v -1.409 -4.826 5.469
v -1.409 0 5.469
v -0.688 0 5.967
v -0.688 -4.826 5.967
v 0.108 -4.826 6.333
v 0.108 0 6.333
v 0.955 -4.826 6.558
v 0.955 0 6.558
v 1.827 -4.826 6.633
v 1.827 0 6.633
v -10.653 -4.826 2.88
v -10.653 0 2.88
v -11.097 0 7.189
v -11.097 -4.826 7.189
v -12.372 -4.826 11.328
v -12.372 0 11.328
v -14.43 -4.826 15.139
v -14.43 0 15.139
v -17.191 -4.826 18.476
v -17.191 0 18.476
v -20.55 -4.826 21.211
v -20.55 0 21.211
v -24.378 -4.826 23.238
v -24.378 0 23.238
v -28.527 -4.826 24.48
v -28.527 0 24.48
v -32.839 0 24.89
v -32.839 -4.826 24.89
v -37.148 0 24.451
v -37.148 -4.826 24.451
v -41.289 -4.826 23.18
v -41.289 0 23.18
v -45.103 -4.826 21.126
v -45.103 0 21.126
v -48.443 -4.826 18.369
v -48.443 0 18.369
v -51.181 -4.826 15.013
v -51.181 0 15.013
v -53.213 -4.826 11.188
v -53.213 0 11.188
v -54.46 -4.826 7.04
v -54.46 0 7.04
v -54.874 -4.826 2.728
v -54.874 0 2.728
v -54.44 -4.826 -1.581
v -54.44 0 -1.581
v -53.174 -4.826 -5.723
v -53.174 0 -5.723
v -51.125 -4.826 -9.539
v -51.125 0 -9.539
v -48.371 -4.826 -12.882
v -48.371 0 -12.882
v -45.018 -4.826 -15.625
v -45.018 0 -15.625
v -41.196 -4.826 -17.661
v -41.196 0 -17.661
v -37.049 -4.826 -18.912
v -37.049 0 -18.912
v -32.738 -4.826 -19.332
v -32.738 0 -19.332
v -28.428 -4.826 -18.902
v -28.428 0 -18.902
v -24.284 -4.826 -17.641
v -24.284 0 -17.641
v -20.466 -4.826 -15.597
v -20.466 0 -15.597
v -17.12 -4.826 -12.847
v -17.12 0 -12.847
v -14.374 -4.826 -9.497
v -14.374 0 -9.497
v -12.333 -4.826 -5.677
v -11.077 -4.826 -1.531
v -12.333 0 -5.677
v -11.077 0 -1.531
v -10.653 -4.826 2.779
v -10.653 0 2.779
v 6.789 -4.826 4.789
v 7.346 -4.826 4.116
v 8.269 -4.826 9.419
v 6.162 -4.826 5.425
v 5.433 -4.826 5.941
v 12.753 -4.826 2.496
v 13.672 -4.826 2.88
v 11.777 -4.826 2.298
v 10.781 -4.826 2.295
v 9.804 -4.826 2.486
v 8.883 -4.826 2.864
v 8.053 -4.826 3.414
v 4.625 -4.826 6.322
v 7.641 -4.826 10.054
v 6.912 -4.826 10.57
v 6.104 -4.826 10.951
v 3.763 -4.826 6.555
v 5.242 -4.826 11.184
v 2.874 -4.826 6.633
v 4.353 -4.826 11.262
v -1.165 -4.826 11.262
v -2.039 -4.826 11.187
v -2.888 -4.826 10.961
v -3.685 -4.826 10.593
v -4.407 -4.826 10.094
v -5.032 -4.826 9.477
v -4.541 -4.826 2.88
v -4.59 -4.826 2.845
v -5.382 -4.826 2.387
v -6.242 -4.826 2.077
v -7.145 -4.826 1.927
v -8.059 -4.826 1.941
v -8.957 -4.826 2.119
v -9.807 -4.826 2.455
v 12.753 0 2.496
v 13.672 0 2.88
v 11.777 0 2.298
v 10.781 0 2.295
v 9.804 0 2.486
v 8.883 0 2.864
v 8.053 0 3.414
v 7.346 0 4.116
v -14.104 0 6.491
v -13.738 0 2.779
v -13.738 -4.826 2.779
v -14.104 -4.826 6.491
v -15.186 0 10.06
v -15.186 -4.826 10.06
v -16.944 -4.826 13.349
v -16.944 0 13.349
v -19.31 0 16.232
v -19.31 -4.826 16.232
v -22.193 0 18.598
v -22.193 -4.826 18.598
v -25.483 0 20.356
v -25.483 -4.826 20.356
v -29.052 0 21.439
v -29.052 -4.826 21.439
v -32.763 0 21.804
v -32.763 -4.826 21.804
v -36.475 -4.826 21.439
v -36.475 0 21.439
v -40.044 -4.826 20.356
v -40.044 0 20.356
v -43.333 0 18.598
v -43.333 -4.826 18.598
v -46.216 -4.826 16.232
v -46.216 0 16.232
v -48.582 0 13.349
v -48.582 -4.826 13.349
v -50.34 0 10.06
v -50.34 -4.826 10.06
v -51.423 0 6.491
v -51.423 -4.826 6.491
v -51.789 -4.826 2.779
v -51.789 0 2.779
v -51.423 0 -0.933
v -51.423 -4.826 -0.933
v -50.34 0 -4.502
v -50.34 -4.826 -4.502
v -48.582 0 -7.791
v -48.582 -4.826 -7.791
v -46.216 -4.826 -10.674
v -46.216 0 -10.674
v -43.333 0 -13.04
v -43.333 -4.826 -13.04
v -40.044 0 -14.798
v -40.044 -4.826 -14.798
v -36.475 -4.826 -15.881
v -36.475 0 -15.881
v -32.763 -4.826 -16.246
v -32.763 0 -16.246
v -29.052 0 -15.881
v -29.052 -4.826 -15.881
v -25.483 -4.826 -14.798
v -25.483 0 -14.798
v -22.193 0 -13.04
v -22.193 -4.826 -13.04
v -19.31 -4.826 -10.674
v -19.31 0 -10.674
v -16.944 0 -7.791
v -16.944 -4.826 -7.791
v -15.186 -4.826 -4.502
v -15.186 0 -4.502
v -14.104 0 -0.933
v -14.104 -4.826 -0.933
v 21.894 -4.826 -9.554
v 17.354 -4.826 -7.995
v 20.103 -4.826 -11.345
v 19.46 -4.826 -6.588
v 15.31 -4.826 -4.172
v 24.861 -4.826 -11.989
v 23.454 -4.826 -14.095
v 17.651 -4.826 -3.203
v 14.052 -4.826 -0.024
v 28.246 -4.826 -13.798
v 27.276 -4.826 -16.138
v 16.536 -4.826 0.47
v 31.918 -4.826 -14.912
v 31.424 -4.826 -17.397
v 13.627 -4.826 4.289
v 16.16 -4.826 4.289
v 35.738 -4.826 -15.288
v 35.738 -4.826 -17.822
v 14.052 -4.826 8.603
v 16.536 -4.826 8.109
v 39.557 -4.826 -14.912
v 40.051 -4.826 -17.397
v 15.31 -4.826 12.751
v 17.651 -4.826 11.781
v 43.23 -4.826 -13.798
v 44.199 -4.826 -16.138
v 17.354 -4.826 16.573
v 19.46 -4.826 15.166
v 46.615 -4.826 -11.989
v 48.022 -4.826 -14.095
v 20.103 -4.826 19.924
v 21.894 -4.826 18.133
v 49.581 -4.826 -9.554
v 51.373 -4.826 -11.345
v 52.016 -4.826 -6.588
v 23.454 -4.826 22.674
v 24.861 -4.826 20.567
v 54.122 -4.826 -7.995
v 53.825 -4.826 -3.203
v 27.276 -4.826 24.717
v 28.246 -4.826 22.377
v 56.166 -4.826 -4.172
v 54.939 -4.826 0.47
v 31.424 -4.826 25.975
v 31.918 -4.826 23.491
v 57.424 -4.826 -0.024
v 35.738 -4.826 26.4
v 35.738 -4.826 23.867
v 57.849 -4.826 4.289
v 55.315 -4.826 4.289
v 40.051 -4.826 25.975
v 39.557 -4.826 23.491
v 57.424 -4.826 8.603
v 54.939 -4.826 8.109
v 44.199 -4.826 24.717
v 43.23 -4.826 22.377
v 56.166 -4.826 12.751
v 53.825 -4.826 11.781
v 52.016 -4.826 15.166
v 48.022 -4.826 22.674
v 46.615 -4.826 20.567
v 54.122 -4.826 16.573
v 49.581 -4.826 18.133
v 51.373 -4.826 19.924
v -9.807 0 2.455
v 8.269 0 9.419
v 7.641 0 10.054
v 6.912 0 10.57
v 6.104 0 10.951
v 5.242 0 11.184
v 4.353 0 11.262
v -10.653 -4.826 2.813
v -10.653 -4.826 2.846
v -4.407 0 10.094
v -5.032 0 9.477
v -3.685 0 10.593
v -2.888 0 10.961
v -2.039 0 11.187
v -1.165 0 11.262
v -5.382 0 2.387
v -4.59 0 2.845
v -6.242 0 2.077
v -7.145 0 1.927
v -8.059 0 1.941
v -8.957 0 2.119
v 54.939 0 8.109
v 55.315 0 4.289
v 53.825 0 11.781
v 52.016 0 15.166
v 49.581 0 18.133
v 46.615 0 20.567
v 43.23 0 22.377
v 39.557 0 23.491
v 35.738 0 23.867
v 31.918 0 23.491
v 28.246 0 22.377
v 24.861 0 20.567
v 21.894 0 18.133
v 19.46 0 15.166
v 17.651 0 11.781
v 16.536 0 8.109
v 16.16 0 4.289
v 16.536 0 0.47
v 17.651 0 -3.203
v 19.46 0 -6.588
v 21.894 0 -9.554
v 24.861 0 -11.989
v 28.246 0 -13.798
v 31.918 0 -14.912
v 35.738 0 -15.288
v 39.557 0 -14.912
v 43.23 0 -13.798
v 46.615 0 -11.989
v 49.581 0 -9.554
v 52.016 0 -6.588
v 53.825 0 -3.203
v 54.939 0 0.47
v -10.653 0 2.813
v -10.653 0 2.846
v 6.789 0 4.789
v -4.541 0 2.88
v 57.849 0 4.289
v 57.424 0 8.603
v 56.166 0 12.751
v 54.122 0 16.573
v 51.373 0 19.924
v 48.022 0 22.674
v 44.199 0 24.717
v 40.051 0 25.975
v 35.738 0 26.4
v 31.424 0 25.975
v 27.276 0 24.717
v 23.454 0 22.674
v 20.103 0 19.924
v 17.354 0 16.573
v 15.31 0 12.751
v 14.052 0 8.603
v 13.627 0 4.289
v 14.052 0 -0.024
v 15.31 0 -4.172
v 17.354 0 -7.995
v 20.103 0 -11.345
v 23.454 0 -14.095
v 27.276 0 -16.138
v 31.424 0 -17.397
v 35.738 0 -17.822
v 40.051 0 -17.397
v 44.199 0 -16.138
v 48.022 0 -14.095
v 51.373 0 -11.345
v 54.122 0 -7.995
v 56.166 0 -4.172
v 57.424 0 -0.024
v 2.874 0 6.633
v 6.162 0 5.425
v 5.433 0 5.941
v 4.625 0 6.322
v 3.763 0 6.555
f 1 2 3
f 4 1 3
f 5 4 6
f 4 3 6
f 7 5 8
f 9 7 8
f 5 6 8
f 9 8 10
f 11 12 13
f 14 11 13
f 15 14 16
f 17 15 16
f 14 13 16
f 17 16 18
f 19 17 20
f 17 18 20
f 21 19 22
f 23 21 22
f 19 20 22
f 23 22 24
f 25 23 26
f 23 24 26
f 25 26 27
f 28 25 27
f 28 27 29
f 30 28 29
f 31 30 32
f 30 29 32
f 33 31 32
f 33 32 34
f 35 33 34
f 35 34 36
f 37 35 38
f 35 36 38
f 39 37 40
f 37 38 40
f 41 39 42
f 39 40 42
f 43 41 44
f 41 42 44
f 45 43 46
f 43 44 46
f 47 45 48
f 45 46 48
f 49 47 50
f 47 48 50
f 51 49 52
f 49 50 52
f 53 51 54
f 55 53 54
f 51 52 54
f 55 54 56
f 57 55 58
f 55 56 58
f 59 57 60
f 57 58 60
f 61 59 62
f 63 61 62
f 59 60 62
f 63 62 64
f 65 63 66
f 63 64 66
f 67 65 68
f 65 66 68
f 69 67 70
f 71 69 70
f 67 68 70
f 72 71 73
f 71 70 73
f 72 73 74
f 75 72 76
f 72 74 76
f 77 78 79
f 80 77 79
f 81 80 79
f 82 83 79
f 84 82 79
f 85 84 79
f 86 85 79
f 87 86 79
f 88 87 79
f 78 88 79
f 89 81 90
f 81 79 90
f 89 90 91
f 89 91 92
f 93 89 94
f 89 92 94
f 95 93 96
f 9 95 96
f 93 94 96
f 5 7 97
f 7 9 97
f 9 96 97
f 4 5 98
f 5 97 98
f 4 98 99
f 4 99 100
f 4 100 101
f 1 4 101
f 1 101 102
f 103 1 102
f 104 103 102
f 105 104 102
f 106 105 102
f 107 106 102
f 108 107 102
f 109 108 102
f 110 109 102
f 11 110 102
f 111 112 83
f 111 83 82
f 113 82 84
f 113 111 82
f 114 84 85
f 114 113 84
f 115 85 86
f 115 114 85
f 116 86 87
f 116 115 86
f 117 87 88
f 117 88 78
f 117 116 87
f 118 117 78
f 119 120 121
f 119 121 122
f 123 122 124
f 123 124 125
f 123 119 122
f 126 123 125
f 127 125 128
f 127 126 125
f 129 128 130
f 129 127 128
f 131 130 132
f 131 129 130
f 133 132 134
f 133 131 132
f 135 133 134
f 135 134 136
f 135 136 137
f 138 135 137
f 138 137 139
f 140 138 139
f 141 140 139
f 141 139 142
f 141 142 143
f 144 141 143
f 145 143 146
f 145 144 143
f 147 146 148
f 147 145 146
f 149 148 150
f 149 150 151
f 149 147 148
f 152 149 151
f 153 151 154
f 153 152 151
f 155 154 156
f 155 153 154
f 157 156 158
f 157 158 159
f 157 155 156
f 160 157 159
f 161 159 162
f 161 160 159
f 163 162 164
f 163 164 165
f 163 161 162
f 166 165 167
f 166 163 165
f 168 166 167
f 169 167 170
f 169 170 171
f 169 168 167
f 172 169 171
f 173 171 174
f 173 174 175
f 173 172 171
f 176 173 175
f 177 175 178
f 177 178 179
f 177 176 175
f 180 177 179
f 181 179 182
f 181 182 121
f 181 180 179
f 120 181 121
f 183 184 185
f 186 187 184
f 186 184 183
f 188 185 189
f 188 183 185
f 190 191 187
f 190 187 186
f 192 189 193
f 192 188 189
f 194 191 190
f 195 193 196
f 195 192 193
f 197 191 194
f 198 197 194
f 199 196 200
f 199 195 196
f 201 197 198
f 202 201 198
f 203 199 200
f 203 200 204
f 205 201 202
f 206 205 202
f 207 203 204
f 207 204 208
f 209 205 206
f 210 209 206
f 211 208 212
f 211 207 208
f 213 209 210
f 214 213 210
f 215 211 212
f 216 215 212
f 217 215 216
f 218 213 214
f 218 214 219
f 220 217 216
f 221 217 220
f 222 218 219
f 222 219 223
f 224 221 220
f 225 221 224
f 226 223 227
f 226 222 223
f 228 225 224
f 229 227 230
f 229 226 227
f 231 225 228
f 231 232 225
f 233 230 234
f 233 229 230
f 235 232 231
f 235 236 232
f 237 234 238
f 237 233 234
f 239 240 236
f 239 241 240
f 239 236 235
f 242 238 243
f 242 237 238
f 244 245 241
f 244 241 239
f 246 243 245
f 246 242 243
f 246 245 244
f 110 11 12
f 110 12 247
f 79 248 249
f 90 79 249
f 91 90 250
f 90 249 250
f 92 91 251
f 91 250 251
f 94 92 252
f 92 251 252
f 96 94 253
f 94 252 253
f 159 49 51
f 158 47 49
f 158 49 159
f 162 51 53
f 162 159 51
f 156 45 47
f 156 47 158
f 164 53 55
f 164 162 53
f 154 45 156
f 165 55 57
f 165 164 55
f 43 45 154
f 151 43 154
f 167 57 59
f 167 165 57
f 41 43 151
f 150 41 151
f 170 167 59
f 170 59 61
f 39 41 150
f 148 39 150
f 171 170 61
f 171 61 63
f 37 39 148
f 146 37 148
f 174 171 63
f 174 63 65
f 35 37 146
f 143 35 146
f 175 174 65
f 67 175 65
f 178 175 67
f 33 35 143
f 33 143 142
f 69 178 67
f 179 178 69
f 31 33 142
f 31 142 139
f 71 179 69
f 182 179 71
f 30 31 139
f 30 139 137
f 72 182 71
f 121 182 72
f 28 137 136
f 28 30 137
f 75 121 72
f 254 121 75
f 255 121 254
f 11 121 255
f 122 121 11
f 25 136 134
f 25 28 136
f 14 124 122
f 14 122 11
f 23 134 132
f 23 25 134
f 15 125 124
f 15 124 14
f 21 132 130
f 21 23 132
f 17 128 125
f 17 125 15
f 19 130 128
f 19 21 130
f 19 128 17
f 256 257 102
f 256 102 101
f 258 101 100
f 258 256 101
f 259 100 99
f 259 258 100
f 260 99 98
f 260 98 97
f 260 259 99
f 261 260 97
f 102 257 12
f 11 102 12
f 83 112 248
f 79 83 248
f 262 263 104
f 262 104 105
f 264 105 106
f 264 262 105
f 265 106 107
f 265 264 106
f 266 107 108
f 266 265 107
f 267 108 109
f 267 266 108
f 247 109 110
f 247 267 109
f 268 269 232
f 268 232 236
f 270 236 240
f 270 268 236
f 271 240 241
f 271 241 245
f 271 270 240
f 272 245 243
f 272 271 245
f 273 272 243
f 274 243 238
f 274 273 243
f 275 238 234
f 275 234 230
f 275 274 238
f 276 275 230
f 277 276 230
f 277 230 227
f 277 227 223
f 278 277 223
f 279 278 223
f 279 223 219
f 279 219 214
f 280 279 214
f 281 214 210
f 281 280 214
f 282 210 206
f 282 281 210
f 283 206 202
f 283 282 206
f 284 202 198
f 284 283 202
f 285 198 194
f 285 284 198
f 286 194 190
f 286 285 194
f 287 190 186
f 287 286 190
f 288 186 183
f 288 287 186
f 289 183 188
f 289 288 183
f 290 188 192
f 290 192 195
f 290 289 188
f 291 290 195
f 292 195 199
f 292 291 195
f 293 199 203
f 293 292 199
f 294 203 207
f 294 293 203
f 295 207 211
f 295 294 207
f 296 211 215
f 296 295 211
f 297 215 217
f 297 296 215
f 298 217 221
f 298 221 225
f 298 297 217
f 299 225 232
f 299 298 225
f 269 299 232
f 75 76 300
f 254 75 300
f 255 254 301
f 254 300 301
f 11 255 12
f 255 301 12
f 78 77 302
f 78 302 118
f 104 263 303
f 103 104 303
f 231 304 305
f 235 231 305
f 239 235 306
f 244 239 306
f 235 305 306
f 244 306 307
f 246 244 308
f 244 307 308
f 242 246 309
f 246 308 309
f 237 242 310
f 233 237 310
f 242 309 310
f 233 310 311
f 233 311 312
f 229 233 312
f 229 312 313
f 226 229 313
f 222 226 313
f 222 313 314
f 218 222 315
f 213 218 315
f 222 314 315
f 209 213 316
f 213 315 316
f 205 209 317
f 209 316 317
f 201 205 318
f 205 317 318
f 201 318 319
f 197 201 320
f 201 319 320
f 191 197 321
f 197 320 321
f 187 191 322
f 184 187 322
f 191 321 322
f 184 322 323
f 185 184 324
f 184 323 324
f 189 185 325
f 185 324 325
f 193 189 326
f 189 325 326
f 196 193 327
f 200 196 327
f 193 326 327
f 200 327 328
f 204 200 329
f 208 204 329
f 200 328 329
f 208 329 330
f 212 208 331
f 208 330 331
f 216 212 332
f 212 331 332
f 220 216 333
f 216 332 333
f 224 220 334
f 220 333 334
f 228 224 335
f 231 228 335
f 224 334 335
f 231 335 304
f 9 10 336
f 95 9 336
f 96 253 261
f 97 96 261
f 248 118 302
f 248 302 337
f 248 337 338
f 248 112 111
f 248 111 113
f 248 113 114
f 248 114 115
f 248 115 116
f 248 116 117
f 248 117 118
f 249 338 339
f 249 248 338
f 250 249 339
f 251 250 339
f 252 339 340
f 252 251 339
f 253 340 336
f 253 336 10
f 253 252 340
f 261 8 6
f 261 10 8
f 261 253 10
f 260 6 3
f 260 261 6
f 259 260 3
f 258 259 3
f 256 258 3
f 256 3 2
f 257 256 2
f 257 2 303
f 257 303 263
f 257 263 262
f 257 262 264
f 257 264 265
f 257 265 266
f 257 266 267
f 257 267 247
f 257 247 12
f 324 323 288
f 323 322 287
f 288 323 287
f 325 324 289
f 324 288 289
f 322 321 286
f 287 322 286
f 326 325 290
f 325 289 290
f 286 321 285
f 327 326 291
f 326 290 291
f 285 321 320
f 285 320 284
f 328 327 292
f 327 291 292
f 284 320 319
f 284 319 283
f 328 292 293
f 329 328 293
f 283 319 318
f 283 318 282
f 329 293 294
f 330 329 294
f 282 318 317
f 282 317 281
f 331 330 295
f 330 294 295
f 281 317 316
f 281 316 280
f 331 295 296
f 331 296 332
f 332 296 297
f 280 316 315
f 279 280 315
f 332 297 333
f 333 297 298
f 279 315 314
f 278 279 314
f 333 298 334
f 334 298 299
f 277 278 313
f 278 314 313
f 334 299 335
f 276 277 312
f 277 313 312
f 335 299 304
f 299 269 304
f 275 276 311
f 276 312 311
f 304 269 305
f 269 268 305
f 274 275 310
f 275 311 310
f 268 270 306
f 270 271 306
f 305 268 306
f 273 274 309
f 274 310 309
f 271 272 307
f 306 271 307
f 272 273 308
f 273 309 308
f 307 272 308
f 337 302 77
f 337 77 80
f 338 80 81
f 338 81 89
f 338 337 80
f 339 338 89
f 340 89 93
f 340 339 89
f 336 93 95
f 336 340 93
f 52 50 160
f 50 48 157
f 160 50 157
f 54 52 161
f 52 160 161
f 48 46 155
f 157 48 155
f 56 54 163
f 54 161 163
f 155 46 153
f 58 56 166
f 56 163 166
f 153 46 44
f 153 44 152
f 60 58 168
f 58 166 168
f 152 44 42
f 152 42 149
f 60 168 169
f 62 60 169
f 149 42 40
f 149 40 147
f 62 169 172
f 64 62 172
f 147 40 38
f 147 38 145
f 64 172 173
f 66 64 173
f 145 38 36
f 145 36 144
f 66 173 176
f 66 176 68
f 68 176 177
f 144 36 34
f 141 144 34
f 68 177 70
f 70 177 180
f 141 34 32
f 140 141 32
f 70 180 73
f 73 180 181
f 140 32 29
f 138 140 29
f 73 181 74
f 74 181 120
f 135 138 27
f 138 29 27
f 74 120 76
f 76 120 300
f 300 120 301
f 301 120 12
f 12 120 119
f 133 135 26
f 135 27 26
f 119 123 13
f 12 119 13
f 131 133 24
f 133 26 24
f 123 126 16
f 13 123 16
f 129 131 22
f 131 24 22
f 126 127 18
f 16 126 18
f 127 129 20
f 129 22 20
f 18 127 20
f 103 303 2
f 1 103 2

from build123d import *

# Parameters (mm, degrees)
F0_R         = 19.577599846
F1_DEPTH     = 4.826
F0_R_2       = 19.025309539
F2_T1_DEPTH  = 4.826
F2_T3_DEPTH  = 4.826
F2_T5_DEPTH  = 31.5234235451
F2_T7_DEPTH  = 16.7860194566
F2_T9_DEPTH  = 16.5531509264
F2_T11_DEPTH = 20.0834356368


# Not quite as in the source:
# - a fillet or chamfer that OpenCascade refuses, or shapes differently, is made with other operations: its cross-section is extruded or revolved along the edge and cut away or added


with BuildPart() as f1:
    # F0 (on Front) → F1 (new body)
    with BuildSketch(Plane.XZ):
        with BuildLine():
            ThreePointArc((13.6721328815, 2.8802125551), (36.442735195, -17.8102871686), (57.8485954466, 4.2891756172))
            ThreePointArc((57.8485954466, 4.2891756172), (35.0330556983, 26.3886384029), (13.6721328815, 2.8802125551))
        make_face()
        with Locations((35.7378954466, 4.2891756172)):
            Circle(F0_R, mode=Mode.SUBTRACT)
    extrude(amount=F1_DEPTH)


with BuildPart() as f1b:
    # F0 (on Front) → F1, piece 2 (new body)
    with BuildSketch(Plane.XZ):
        with BuildLine():
            ThreePointArc((-10.6526581482, 2.7790347432), (-10.6527160219, 2.8296237815), (-10.6528896426, 2.8802125551))
            ThreePointArc((-10.6528896426, 2.8802125551), (-54.8740002746, 2.7284457048), (-10.6526581482, 2.7790347432))
        make_face()
        with Locations((-32.7633581482, 2.7790347432)):
            Circle(F0_R_2, mode=Mode.SUBTRACT)
    extrude(amount=F1_DEPTH)


with BuildPart() as f1c:
    # F0 (on Front) → F1, piece 3 (new body)
    with BuildSketch(Plane.XZ):
        Polygon((10.7475112172, 0), (13.6721328815, 2.8802125551), (6.7447727473, 11.2624050619), (-3.5103600677, 11.2624050619), (-10.6528896426, 2.8802125551), (-7.0816248551, 1.0832078445), (-4.5412281389, 2.8802125551), (0, 6.6332548222), (5.2655391702, 6.6332548222), align=None)
    extrude(amount=F1_DEPTH)

    # F2: fillet of radius 5.08 on 6 edges, made by hand

    # F2_s2 → F2_t1 (join)
    with BuildSketch(Plane.XZ):
        with BuildLine():
            ThreePointArc((-1.4086830483, 5.4690660038), (0.1078865603, 6.3333552815), (1.8274910494, 6.6332548222))
            Line((1.8274910494, 6.6332548222), (0, 6.6332548222))
            Line((0, 6.6332548222), (-1.4086830483, 5.4690660038))
        make_face()
    extrude(amount=F2_T1_DEPTH)

    # F2_s4 → F2_t3 (join)
    with BuildSketch(Plane.XZ):
        with BuildLine():
            ThreePointArc((6.7893464605, 4.7894289199), (5.0376327333, 6.1492402669), (2.8735352789, 6.6332548222))
            Line((2.8735352789, 6.6332548222), (5.2655391702, 6.6332548222))
            Line((5.2655391702, 6.6332548222), (6.7893464605, 4.7894289199))
        make_face()
    extrude(amount=F2_T3_DEPTH)

    # F2_s6 → F2_t5 (cut)
    with BuildSketch(Plane.XZ.offset(-13.3487117726)):
        with BuildLine():
            ThreePointArc((13.6721328815, 2.8802125551), (10.2880191967, 2.3662176021), (7.3460344239, 4.1158295133))
            Line((7.3460344239, 4.1158295133), (10.7475112172, 0))
            Line((10.7475112172, 0), (13.6721328815, 2.8802125551))
        make_face()
    extrude(amount=F2_T5_DEPTH, mode=Mode.SUBTRACT)

    # F2_s8 → F2_t7 (cut)
    with BuildSketch(Plane.XZ.offset(-5.9800097283)):
        with BuildLine():
            ThreePointArc((8.2685800376, 9.4185791596), (6.5168663104, 10.7783905066), (4.352768856, 11.2624050619))
            Line((4.352768856, 11.2624050619), (6.7447727473, 11.2624050619))
            Line((6.7447727473, 11.2624050619), (8.2685800376, 9.4185791596))
        make_face()
    extrude(amount=F2_T7_DEPTH, mode=Mode.SUBTRACT)

    # F2_s10 → F2_t9 (cut)
    with BuildSketch(Plane.XZ.offset(-5.8635754632)):
        with BuildLine():
            ThreePointArc((-5.0315573811, 9.4771875716), (-3.2943552568, 10.7945572249), (-1.1649298824, 11.2624050619))
            Line((-1.1649298824, 11.2624050619), (-3.5103600677, 11.2624050619))
            Line((-3.5103600677, 11.2624050619), (-5.0315573811, 9.4771875716))
        make_face()
    extrude(amount=F2_T9_DEPTH, mode=Mode.SUBTRACT)

    # F2_s12 → F2_t11 (cut)
    with BuildSketch(Plane.XZ.offset(-7.6287178184)):
        with BuildLine():
            ThreePointArc((-4.5904071854, 2.84542469), (-7.1447926035, 1.9268884046), (-9.8074770052, 2.4548141088))
            Line((-9.8074770052, 2.4548141088), (-7.0816248551, 1.0832078445))
            Line((-7.0816248551, 1.0832078445), (-4.5904071854, 2.84542469))
        make_face()
    extrude(amount=F2_T11_DEPTH, mode=Mode.SUBTRACT)


solid = Compound([f1.part, f1b.part, f1c.part])
